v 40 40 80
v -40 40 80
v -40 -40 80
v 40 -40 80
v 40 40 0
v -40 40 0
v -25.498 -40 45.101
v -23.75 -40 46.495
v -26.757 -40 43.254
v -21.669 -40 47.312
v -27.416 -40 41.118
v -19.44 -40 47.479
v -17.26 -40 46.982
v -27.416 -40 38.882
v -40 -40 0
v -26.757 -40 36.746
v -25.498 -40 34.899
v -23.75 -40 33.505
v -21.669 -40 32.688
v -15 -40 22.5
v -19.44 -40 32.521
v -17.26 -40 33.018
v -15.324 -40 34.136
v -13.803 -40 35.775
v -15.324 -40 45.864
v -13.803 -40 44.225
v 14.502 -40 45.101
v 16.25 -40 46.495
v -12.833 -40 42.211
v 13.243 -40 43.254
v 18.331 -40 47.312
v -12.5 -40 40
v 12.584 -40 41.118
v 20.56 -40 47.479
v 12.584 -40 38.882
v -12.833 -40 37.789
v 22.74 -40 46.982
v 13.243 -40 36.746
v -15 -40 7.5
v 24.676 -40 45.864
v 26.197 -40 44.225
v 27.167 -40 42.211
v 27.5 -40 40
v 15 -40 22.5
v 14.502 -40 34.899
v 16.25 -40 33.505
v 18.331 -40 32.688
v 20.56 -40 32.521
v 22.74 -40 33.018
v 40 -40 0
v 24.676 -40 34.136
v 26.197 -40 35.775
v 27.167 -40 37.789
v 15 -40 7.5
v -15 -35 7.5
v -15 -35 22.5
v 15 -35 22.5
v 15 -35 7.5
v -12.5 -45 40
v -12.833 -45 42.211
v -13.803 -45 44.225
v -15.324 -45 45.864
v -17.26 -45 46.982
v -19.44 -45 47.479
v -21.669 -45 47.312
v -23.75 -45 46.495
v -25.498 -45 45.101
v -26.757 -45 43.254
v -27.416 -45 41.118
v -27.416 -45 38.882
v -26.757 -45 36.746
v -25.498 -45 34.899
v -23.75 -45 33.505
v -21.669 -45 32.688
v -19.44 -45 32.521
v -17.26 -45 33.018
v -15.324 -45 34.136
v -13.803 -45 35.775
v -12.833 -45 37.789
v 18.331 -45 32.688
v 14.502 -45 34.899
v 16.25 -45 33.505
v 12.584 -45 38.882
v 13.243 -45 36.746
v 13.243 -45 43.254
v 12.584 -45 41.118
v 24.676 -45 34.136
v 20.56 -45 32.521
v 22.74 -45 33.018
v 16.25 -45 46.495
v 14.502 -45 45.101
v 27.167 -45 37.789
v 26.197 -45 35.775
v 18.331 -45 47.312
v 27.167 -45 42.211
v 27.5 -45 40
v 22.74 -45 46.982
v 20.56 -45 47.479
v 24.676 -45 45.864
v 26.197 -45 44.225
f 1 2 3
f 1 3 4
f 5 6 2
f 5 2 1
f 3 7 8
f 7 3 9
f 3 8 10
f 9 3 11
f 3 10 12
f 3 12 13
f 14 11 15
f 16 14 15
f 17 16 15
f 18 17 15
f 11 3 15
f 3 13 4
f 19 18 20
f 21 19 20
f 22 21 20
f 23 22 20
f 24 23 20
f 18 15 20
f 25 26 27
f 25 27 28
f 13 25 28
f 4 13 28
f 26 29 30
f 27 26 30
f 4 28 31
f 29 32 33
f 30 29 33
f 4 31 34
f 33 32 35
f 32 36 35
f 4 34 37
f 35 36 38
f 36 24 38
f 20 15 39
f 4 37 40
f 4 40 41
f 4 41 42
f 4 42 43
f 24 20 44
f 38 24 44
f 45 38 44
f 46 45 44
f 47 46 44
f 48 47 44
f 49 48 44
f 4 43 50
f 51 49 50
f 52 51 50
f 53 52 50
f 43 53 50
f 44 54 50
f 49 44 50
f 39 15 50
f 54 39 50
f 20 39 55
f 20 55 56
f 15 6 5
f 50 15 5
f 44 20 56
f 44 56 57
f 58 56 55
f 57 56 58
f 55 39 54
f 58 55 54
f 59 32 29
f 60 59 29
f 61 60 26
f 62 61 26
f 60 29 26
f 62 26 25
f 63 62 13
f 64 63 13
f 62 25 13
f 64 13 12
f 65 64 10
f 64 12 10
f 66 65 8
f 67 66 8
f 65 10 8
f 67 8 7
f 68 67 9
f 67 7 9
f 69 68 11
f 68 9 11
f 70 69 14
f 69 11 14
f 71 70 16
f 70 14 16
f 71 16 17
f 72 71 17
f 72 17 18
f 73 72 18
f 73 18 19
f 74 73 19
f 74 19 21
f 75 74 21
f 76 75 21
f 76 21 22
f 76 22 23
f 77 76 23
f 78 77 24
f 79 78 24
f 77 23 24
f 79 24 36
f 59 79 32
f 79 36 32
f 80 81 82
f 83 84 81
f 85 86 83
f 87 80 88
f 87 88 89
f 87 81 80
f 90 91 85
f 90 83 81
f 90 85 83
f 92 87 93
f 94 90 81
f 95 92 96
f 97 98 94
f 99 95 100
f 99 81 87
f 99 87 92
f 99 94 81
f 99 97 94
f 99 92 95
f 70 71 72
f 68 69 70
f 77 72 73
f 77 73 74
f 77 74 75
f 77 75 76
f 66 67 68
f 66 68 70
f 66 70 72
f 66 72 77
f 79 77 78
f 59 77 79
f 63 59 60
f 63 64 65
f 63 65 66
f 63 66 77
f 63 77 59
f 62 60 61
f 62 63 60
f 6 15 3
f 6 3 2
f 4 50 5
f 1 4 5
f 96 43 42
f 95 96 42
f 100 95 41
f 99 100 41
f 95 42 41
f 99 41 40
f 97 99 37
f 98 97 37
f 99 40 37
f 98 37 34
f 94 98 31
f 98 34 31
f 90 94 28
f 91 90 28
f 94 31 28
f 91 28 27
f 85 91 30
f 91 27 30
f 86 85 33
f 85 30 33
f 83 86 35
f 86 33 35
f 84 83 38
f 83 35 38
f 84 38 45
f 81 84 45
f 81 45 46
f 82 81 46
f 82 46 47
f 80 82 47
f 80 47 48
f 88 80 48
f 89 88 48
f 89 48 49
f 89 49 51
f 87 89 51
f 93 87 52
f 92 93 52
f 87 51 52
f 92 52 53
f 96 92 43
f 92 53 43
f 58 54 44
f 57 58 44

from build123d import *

# Parameters (mm, degrees)
F0_W     = 80
F0_H     = 80
F1_DEPTH = 80
F2_R     = 7.5
F3_DEPTH = 5
F4_W     = 30
F4_H     = 15
F5_DEPTH = 5


with BuildPart() as f1:
    # F0 (on Top) → F1 (new body)
    with BuildSketch(Plane.XY):
        Rectangle(F0_W, F0_H)
    extrude(amount=F1_DEPTH)

    # F2 (on face) → F3 (join)
    with BuildSketch(Plane.XZ.offset(40)):
        with Locations((-20, 40)):
            Circle(F2_R)
        with Locations((20, 40)):
            Circle(F2_R)
    extrude(amount=F3_DEPTH)

    # F4 (on face) → F5 (cut)
    with BuildSketch(Plane.XZ.offset(40)):
        with Locations((0, 15)):
            Rectangle(F4_W, F4_H)
    extrude(amount=-F5_DEPTH, mode=Mode.SUBTRACT)


solid = f1.part
